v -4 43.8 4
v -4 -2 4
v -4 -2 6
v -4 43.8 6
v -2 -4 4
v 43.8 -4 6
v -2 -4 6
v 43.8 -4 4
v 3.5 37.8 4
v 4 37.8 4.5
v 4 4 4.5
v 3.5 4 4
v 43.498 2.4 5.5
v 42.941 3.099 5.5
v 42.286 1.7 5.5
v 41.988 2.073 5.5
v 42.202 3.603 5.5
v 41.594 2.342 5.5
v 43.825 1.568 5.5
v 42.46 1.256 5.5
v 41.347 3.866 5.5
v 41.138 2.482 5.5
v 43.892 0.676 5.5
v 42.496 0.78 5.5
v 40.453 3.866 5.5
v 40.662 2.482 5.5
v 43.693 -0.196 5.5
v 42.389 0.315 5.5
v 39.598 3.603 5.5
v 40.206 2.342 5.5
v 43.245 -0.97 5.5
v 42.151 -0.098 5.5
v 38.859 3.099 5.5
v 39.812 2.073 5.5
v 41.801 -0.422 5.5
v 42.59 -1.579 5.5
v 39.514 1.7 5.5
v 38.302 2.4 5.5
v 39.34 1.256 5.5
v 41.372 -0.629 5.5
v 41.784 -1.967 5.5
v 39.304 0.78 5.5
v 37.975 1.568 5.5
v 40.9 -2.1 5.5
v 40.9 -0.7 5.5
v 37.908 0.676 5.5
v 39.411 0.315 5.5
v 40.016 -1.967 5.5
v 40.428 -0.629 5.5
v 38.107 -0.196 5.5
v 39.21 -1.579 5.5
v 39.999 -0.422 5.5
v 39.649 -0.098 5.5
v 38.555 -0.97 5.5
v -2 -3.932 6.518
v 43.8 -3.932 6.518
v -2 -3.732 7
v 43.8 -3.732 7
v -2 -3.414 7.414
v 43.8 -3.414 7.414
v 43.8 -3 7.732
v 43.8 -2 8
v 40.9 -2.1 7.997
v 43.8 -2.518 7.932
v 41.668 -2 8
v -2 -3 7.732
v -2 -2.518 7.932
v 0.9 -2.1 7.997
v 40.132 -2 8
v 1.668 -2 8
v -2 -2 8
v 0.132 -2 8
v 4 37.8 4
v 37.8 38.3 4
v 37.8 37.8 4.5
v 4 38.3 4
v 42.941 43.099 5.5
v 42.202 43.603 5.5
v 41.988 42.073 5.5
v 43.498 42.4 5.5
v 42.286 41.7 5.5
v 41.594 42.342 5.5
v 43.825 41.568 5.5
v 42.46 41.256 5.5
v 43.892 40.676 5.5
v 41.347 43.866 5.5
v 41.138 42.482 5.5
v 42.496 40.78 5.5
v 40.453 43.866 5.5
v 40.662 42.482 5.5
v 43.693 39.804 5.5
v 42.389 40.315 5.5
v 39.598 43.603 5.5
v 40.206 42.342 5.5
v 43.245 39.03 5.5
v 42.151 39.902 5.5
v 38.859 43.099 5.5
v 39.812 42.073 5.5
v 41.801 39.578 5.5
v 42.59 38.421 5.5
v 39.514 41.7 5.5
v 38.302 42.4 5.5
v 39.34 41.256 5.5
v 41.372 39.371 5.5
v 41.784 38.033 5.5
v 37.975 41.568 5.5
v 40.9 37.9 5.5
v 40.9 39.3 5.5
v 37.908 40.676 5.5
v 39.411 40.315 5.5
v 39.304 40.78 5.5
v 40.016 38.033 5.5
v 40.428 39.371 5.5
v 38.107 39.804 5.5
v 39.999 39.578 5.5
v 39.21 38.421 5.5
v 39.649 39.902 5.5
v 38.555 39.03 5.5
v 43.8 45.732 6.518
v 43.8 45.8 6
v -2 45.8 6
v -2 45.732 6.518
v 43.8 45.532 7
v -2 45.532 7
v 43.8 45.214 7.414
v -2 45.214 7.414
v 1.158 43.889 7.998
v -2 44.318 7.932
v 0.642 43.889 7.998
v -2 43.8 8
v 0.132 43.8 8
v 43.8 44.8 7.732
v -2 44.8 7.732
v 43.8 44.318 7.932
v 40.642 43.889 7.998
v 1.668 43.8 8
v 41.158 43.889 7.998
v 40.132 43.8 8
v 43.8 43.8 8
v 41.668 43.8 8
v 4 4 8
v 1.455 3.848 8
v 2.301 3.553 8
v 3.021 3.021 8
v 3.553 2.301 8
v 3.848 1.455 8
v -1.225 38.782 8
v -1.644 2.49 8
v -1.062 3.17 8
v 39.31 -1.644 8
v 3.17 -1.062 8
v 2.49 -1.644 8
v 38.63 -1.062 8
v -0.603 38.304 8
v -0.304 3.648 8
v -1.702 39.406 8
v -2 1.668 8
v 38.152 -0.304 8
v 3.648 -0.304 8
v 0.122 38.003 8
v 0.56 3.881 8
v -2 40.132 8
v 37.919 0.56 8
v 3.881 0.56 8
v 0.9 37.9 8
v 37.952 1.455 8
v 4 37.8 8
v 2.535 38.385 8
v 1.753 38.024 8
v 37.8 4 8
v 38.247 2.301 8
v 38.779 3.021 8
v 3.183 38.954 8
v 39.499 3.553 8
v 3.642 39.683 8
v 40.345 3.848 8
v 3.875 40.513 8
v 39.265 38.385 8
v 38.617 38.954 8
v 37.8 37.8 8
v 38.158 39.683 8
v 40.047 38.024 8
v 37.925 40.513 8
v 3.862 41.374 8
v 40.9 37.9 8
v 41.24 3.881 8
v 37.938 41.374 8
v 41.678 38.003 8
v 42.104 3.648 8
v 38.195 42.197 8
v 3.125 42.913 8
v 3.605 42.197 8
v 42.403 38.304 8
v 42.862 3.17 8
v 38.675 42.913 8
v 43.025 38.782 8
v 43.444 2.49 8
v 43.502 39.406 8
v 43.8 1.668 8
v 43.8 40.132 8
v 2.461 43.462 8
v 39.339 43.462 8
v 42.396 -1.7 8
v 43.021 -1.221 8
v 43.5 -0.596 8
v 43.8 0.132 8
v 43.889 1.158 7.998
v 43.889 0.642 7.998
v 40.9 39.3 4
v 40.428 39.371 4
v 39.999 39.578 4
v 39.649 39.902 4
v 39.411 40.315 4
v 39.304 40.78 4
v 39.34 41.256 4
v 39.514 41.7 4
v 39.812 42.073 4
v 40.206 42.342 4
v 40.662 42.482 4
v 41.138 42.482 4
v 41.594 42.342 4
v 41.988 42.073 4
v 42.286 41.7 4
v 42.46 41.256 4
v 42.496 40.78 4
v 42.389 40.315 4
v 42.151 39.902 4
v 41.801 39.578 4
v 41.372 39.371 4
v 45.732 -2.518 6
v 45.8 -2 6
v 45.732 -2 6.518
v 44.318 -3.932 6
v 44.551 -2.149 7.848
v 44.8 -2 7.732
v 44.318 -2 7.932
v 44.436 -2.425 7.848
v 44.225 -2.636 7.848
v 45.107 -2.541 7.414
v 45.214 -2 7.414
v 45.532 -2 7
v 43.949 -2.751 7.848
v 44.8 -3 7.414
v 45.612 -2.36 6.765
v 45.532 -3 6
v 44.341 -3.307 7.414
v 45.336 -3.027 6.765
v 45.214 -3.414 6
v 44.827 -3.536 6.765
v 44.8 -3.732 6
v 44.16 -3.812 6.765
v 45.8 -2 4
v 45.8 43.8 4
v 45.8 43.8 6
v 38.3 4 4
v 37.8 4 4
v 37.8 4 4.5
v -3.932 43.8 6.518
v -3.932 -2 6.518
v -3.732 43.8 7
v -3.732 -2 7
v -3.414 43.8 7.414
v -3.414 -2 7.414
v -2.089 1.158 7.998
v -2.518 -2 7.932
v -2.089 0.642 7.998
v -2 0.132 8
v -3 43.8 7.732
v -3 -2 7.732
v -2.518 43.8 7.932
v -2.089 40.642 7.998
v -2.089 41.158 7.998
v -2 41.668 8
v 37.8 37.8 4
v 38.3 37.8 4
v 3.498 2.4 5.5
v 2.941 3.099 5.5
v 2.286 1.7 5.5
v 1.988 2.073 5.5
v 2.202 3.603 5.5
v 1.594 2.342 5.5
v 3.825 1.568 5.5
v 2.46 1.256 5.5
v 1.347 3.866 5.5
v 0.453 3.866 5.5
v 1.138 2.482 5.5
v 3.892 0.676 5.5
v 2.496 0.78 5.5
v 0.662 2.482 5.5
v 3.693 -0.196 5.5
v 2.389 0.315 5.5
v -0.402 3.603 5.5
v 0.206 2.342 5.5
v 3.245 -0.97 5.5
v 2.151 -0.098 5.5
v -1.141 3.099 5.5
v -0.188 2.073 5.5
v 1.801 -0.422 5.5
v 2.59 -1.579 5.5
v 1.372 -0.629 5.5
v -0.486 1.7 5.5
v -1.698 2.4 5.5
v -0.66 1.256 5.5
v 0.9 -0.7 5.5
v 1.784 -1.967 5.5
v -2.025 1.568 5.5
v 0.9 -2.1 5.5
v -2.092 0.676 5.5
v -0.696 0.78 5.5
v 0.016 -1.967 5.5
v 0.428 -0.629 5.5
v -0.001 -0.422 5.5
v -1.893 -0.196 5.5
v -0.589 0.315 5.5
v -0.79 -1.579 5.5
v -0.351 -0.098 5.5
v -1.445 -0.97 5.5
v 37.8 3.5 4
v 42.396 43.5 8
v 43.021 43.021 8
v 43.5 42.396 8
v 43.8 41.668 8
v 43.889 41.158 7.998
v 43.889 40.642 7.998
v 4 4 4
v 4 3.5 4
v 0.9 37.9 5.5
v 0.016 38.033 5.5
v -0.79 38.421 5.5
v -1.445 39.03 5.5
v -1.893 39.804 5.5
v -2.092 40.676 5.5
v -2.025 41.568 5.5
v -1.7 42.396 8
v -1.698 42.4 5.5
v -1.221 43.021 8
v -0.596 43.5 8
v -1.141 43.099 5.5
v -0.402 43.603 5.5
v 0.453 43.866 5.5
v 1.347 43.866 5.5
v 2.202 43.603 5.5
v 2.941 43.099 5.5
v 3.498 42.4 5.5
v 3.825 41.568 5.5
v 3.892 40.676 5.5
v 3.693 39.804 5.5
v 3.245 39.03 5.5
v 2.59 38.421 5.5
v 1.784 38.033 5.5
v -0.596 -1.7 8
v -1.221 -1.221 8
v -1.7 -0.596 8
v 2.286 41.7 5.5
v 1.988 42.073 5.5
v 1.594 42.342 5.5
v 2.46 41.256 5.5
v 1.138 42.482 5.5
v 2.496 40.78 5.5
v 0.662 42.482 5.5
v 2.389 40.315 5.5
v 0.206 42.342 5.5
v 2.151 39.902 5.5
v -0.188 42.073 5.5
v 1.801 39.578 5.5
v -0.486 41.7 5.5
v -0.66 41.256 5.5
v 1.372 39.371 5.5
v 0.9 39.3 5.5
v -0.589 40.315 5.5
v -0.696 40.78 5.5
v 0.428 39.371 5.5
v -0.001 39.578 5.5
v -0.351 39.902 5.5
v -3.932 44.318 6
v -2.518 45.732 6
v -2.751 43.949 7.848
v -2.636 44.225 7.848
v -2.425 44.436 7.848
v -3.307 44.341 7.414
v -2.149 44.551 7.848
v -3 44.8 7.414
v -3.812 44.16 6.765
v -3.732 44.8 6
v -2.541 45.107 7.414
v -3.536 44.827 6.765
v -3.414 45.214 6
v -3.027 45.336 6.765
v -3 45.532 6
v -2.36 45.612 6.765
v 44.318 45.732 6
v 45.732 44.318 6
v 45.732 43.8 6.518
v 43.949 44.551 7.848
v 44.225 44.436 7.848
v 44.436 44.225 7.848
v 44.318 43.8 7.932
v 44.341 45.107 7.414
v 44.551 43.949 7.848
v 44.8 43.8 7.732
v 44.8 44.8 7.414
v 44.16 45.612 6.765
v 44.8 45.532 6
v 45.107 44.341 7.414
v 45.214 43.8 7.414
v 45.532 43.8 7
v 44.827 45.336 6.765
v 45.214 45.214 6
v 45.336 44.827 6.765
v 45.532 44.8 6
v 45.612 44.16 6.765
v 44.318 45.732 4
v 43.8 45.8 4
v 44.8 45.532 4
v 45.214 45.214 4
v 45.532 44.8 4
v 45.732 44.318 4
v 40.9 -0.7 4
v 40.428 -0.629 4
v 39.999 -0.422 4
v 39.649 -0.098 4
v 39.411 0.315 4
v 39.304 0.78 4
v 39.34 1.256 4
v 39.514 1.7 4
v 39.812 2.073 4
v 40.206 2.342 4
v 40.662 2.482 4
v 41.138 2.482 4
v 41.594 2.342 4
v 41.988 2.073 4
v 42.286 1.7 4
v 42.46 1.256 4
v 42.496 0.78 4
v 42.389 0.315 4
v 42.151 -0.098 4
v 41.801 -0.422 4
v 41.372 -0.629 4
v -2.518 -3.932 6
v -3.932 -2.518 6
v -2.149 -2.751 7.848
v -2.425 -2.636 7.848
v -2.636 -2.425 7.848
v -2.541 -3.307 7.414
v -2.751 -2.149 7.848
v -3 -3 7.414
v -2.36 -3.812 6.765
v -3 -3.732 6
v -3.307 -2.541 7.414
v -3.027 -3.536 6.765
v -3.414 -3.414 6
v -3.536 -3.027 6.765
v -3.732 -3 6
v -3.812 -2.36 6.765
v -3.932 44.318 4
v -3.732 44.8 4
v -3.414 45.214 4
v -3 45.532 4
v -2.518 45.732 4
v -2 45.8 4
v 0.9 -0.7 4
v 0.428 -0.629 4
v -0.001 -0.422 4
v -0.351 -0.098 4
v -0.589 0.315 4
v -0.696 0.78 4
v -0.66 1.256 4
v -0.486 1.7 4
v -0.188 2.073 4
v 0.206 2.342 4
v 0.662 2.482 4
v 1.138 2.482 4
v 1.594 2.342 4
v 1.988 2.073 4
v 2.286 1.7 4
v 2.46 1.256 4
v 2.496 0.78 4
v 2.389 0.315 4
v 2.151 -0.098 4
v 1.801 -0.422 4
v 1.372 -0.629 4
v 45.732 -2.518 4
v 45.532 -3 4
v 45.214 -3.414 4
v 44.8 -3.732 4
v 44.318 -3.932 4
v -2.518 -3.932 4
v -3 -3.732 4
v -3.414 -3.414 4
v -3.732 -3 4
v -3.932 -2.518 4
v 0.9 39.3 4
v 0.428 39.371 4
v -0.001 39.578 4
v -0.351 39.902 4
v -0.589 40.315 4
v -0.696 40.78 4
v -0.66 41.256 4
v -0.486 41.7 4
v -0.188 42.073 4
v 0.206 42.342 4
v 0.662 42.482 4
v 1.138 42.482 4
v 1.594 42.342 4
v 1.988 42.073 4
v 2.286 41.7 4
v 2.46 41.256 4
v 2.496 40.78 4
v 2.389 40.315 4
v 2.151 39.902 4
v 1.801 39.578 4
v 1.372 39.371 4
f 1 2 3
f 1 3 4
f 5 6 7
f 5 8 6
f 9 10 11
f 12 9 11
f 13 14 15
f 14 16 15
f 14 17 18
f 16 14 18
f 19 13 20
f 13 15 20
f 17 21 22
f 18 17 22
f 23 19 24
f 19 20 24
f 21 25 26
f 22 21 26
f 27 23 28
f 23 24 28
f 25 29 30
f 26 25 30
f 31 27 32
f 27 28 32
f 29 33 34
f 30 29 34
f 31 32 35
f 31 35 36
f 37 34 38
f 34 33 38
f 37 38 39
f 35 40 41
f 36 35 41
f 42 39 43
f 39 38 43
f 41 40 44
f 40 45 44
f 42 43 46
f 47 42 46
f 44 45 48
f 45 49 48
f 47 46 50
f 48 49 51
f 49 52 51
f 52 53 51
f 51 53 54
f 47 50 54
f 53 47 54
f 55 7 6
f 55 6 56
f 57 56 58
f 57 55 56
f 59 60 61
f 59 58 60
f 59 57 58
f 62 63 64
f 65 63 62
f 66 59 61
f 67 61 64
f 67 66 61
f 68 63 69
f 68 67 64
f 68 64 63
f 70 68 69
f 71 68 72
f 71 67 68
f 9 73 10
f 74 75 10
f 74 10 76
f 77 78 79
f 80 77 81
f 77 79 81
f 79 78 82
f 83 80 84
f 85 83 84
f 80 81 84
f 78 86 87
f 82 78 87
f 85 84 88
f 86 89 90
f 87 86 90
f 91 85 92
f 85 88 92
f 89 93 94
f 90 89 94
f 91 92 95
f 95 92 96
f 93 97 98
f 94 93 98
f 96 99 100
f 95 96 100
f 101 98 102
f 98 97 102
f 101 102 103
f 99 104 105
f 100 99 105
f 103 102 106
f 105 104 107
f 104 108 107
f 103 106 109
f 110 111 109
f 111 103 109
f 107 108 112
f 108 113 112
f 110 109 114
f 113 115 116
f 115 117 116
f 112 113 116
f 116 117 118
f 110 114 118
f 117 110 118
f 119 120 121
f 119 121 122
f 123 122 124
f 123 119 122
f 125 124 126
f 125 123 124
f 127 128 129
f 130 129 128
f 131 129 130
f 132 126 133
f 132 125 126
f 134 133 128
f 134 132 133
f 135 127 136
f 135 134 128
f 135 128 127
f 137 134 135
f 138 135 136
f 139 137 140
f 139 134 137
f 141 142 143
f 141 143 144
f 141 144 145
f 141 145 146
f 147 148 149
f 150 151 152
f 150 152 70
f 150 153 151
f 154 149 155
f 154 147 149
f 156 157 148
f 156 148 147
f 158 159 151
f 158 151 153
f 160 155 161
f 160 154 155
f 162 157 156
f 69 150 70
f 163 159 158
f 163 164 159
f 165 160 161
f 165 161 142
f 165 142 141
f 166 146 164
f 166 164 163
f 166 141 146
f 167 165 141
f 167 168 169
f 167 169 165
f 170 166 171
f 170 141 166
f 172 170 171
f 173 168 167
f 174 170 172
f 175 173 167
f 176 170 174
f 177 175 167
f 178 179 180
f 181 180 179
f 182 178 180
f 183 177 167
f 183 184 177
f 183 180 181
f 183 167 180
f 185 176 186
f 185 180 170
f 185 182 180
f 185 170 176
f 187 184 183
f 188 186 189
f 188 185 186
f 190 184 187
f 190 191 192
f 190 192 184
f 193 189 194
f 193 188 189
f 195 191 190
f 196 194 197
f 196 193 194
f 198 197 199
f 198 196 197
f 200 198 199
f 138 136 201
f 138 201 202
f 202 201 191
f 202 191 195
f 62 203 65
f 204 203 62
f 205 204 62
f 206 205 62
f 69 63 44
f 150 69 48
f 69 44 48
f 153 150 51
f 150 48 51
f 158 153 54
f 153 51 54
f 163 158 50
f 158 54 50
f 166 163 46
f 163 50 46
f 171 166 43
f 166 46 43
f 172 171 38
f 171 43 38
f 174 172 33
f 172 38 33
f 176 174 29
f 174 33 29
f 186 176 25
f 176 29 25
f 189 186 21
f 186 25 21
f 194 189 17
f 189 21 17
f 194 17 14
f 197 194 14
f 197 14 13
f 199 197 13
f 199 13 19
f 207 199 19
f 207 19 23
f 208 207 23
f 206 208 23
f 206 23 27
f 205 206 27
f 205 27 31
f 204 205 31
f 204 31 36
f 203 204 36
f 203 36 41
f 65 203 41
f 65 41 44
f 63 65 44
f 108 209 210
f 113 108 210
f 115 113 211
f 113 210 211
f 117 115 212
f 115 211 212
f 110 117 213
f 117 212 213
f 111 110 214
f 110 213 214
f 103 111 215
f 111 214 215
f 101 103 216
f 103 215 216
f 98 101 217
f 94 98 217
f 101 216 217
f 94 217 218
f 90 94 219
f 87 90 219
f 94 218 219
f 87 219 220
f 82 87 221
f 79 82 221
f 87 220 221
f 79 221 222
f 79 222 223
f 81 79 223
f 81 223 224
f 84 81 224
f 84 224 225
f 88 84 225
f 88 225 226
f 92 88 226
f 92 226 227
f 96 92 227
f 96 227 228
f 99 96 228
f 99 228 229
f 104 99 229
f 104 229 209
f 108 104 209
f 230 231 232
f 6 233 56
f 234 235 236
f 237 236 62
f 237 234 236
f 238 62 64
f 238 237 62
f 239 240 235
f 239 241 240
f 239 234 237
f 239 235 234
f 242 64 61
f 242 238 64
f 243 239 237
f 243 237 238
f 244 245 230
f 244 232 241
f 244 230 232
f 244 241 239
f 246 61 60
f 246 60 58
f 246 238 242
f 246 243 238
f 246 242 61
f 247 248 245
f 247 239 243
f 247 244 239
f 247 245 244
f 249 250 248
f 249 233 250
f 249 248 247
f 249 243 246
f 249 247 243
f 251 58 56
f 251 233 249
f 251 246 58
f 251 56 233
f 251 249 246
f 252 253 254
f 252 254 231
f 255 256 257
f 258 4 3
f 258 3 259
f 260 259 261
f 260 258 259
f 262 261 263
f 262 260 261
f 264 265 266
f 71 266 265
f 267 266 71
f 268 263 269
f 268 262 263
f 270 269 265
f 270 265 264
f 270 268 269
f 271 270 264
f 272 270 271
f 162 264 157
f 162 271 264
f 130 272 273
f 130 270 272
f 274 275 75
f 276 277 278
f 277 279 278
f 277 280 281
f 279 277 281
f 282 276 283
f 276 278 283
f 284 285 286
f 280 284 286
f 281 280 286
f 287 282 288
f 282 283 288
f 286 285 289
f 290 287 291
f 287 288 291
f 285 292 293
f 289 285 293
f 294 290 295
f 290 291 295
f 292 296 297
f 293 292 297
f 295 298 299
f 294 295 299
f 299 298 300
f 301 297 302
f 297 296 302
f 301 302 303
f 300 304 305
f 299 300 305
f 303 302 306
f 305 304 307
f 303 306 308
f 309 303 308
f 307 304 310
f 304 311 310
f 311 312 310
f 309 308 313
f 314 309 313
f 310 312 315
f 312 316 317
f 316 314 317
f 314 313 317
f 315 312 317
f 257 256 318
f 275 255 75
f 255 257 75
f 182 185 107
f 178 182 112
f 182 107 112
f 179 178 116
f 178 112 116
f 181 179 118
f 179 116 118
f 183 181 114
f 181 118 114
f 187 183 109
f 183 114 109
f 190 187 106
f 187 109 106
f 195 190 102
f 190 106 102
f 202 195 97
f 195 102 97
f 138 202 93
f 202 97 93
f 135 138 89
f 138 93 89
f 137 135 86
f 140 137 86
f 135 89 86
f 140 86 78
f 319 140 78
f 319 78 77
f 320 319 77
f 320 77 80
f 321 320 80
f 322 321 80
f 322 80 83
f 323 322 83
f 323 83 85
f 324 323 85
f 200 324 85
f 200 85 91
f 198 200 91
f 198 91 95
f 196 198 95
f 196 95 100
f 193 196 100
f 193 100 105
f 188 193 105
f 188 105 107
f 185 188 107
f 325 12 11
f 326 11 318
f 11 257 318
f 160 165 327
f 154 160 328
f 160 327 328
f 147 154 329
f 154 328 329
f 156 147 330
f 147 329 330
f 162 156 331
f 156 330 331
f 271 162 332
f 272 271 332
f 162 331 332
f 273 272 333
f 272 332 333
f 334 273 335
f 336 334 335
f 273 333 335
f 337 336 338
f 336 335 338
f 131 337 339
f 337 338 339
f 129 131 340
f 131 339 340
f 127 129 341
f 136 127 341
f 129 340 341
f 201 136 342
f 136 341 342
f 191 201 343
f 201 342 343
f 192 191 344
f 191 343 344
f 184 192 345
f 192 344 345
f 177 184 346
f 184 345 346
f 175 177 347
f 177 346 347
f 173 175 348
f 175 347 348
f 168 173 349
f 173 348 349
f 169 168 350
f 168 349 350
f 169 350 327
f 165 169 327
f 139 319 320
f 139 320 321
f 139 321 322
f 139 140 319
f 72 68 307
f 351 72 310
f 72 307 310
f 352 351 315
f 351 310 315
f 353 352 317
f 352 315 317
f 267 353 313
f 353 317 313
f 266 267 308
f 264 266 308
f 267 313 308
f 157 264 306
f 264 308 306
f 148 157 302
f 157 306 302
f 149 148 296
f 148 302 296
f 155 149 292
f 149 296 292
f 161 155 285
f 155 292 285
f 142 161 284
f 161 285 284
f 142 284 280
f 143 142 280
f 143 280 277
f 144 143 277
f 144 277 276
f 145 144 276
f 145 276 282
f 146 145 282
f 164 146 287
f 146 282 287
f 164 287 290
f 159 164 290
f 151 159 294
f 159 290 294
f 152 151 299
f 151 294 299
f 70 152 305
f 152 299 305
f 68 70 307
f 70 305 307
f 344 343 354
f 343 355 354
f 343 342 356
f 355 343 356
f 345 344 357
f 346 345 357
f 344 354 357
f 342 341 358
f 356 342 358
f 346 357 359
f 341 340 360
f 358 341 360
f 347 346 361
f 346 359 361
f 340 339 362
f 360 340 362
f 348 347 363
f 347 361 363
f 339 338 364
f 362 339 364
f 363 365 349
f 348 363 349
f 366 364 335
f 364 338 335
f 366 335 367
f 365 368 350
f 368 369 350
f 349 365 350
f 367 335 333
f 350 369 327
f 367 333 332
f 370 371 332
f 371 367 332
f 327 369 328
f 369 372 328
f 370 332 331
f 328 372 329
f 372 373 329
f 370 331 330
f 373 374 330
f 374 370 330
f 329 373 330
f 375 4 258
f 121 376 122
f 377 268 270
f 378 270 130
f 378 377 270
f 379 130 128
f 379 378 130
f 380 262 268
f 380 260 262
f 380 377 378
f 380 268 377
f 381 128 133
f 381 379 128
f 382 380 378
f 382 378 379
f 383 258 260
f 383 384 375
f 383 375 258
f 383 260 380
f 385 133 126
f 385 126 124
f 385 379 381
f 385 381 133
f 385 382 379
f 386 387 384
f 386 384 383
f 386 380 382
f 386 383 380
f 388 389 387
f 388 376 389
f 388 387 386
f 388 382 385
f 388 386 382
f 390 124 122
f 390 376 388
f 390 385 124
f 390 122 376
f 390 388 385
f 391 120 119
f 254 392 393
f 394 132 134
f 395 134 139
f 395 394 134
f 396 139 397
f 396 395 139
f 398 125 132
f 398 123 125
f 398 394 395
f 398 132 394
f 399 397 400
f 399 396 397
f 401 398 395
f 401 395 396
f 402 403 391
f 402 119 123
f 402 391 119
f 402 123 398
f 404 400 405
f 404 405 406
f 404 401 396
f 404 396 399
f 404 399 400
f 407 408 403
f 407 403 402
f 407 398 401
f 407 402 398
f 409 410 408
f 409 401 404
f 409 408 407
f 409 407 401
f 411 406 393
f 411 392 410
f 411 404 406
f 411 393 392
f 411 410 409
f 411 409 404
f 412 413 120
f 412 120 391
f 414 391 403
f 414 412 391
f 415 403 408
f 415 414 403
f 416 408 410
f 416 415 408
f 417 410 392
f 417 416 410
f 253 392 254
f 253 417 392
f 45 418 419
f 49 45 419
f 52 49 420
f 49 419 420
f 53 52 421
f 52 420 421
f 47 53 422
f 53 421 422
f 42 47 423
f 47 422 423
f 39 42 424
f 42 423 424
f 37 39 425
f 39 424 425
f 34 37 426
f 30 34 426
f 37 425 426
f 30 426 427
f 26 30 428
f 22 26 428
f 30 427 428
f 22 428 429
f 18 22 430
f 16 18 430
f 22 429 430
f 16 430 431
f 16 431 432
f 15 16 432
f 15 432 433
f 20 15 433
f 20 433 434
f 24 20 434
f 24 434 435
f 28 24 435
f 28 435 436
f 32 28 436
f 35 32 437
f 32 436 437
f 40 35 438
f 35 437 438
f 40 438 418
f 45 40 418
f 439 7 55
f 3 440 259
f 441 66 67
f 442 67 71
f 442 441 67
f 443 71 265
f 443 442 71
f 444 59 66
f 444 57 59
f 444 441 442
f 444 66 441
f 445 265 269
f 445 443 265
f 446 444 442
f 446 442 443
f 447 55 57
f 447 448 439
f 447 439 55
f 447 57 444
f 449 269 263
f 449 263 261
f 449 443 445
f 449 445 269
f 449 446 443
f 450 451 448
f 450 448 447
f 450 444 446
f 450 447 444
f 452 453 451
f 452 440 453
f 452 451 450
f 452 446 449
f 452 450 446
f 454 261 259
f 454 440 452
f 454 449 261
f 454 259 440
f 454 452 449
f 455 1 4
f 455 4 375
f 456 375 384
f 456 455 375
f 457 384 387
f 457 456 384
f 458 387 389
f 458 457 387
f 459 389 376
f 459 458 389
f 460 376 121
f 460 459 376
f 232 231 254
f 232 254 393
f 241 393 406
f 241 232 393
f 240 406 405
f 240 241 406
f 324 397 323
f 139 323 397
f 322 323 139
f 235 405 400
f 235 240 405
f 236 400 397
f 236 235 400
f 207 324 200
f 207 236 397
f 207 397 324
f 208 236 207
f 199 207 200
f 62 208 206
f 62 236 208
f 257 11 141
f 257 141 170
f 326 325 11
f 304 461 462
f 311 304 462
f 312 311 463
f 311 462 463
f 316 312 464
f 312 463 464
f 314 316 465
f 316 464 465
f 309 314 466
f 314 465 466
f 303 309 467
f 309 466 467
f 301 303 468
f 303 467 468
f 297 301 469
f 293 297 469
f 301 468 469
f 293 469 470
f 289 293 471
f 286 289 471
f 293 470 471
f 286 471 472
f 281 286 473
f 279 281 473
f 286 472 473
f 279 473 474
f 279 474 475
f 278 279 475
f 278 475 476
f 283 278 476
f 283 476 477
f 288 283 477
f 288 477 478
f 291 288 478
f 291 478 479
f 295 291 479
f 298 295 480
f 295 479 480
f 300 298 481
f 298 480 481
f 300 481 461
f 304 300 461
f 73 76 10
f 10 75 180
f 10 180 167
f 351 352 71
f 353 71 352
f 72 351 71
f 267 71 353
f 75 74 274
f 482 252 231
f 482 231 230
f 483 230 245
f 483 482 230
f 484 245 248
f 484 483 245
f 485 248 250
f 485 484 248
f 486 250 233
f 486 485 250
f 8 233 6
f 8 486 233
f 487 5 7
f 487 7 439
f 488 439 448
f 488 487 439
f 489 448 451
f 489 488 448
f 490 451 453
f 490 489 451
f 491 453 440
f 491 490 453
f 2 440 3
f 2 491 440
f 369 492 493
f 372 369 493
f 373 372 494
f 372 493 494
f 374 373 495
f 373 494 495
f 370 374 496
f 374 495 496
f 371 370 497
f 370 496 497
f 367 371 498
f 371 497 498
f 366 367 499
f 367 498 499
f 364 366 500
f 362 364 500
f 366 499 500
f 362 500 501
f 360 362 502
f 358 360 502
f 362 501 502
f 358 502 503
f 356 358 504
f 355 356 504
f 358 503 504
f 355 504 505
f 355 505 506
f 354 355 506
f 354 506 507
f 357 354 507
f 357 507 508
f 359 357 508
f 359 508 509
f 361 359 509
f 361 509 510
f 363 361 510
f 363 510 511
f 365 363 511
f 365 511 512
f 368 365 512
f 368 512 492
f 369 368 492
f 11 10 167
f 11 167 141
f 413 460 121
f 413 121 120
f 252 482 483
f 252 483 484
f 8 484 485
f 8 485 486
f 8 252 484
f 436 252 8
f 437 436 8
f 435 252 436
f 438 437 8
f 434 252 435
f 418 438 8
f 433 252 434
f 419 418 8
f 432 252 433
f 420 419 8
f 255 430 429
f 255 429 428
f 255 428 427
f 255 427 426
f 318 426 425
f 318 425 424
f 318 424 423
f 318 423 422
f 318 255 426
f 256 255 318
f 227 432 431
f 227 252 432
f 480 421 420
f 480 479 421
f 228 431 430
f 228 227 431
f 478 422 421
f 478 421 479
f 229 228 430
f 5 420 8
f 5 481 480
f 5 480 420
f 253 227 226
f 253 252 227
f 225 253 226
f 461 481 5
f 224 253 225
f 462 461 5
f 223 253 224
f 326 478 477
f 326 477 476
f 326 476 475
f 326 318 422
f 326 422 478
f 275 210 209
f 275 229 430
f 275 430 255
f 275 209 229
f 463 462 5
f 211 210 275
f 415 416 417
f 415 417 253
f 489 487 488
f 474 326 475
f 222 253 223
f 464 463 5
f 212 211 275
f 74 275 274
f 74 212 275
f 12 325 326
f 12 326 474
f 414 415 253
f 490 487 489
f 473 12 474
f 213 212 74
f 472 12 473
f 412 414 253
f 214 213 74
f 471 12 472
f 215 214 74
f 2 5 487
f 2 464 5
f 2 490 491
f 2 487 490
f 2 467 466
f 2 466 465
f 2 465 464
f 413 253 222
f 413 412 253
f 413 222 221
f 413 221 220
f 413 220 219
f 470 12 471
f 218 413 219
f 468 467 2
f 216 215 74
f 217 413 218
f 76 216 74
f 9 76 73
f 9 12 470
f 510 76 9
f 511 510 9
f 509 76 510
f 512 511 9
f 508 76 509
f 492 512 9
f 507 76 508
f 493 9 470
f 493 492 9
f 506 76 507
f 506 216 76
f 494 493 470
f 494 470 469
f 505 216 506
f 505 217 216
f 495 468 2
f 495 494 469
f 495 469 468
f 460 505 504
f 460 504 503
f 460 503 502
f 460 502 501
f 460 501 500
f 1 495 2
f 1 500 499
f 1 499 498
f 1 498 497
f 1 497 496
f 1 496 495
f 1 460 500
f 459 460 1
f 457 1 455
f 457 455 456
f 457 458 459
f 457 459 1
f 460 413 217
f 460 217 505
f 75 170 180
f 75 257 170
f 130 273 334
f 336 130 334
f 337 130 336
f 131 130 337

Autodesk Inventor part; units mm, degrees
ref_plane "YZ Plane" through (0, 0, 0) normal (1, 0, 0) x (0, 1, 0)
ref_plane "XZ Plane" through (0, 0, 0) normal (0, 1, 0) x (-1, 0, 0)
ref_plane "XY Plane" through (0, 0, 0) normal (0, 0, 1) x (1, 0, 0)
ref_plane "Work Plane1" through (0, 41.8, 0) normal (0, 0, 1) x (1, 0, 0)
sketch "Sketch1" plane through (0, 41.8, 0) normal (0, 0, 1) x (1, 0, 0)
  line L0 (4, 0.3838) -> (4, 4) construction
  line L1 (4, 4) -> (-2, 4) construction
  arc A0 (-2, 4) -> (-4, 2) centre (-2, 2) ccw construction
  line L2 (-4, 2) -> (-4, -4) construction
  line L3 (-4, -4) -> (-0.3838, -4) construction
  arc A1 (45.8, 2) -> (43.8, 4) centre (43.8, 2) ccw construction
  line L4 (43.8, 4) -> (37.8, 4) construction
  line L5 (37.8, 4) -> (37.8, 0.3838) construction
  line L6 (42.1838, -4) -> (45.8, -4) construction
  line L7 (45.8, -4) -> (45.8, 2) construction
  line L8 (37.8, -42.1838) -> (37.8, -45.8) construction
  line L9 (37.8, -45.8) -> (43.8, -45.8) construction
  arc A2 (43.8, -45.8) -> (45.8, -43.8) centre (43.8, -43.8) ccw construction
  line L10 (45.8, -43.8) -> (45.8, -37.8) construction
  line L11 (45.8, -37.8) -> (42.1838, -37.8) construction
  line L12 (-0.3838, -37.8) -> (-4, -37.8) construction
  line L13 (-4, -37.8) -> (-4, -43.8) construction
  arc A3 (-4, -43.8) -> (-2, -45.8) centre (-2, -43.8) ccw construction
  line L14 (-2, -45.8) -> (4, -45.8) construction
  line L15 (4, -45.8) -> (4, -42.1838) construction
  line L16 (-2, 4) -> (43.8, 4)
  line L17 (45.8, 2) -> (45.8, -43.8)
  line L18 (43.8, -45.8) -> (-2, -45.8)
  line L19 (-4, -43.8) -> (-4, 2)
  line L20 (40.3, -37.8) -> (40.3, -4)
  line L21 (37.8, -1.5) -> (4, -1.5)
  line L22 (1.5, -4) -> (1.5, -37.8)
  line L23 (4, -40.3) -> (37.8, -40.3)
  line L24 (37.8, -40.3) -> (40.3, -37.8)
  line L25 (4, -40.3) -> (1.5, -37.8)
  line L26 (4, -1.5) -> (1.5, -4)
  line L27 (40.3, -4) -> (37.8, -1.5)
  arc A4 (45.8, 2) -> (43.8, 4) centre (43.8, 2) ccw
  arc A5 (43.8, -45.8) -> (45.8, -43.8) centre (43.8, -43.8) ccw
  arc A6 (-4, -43.8) -> (-2, -45.8) centre (-2, -43.8) ccw
  arc A7 (-2, 4) -> (-4, 2) centre (-2, 2) ccw
  circle A8 centre (1, -1) radius 1.4
  circle A9 centre (40.8, -1) radius 1.4
  circle A10 centre (40.8, -40.8) radius 1.4
  circle A11 centre (1, -40.8) radius 1.4
  circle A12 centre (20.9, -20.9) radius 19.4 construction
  line L28 (4, -4) -> (4, -37.8)
  line L29 (4, -37.8) -> (37.8, -37.8)
  line L30 (37.8, -37.8) -> (37.8, -4)
  line L31 (37.8, -4) -> (4, -4)
  arc A13 (39.5978, -40.386) -> (40.386, -39.5978) centre (40.9, -40.9) ccw projected
  line L32 (39.5978, -40.386) -> (37.8, -42.1838) projected
  line L33 (42.1838, -37.8) -> (40.386, -39.5978) projected
  arc A14 (1.414, -39.5978) -> (2.2022, -40.386) centre (0.9, -40.9) ccw projected
  line L34 (1.414, -39.5978) -> (-0.3838, -37.8) projected
  line L35 (4, -42.1838) -> (2.2022, -40.386) projected
  arc A15 (40.386, -2.2022) -> (39.5978, -1.414) centre (40.9, -0.9) ccw projected
  line L36 (40.386, -2.2022) -> (42.1838, -4) projected
  line L37 (37.8, 0.3838) -> (39.5978, -1.414) projected
  arc A16 (2.2022, -1.414) -> (1.414, -2.2022) centre (0.9, -0.9) ccw projected
  line L38 (2.2022, -1.414) -> (4, 0.3838) projected
  line L39 (-0.3838, -4) -> (1.414, -2.2022) projected
  point P0 (45.8, -45.8)
  point P1 (45.8, 4)
  point P2 (-4, -45.8)
  point P3 (40.3, -40.3)
  point P4 (40.3, -1.5)
  point P5 (1.5, -1.5)
  point P6 (1.5, -40.3)
  point P7 (40.8, -1)
  dimension "d55" = 2.8
  dimension "d56" = 2.8
  dimension "d57" = 2.8
  dimension "d58" = 2.8
  dimension "d34" = 49.8
  dimension "d35" = 49.8
  dimension "d36" = 5.5
  dimension "d37" = 2.5
  dimension "d38" = 2.5
  dimension "d39" = 2.5
  dimension "d40" = 2.5
  dimension "d41" = 2.5
  dimension "d42" = 2.5
  dimension "d43" = 2.5
  dimension "d44" = 2.5
  dimension "d45" = 2
  dimension "d46" = 5
  dimension "d47" = 5
  dimension "d48" = 5
  dimension "d49" = 5
  dimension "d50" = 5
  dimension "d51" = 5
  dimension "d52" = 0.5
  dimension "d53" = 5
  dimension "d54" = 5
  dimension "d90" = 8
extrude "Extrusion1" add sketch "Sketch1" along normal blind 8 contours L16 A4 L17 A5 L18 A6 L19 A7 | L24 L23 L25 L22 L26 L21 L27 L20 | A8 A16 | A9 A15 | A10 A13 | A14 A11
fillet "Fillet1" radius 2 8 edges at (20.9, -4, 8) (45.2142, -3.4142, 8) (45.8, 20.9, 8) (45.2142, 45.2142, 8) (20.9, 45.8, 8) (-3.4142, 45.2142, 8) (-4, 20.9, 8) (-3.4142, -3.4142, 8)
sketch "Sketch2" plane through (-2, -4, 0) normal (0, -1, 0) x (1, 0, 0)
  line L0 (43.8, -4.8712) -> (42.35, -4)
  line L1 (2, -4.8712) -> (0.55, -4)
  line L2 (-2, 0) -> (-2, 6) construction
  line L3 (45.8, 8) -> (0, 8) construction
  line L4 (47.8, 0) -> (47.8, 6) construction
  circle A0 centre (2.9, -36.9) radius 1.45 projected
  line L5 (0, -41.8) -> (45.8, -41.8) projected
  point P0 (2, 0)
  point P1 (2.9, 3.1)
  point P2 (42.9, 3.1)
  dimension "d59" = 4.9
  dimension "d60" = 4.9
  dimension "d61" = 4.9
  dimension "d62" = 4.9
hole "Hole1" [suppressed]
sketch "Sketch3" plane through (0, 41.8, 8) normal (0, 0, 1) x (1, 0, 0)
  circle A0 centre (20.9, -20.9) radius 16.9 construction
  point P0 (0, -41.8)
sketch "Sketch4" plane through (0, 41.8, 8) normal (0, 0, 1) x (1, 0, 0)
  line L0 (37.8, -37.8) -> (37.8, -4) projected
  line L1 (37.8, -4) -> (4, -4) projected
  line L2 (4, -4) -> (4, -37.8) projected
  line L3 (4, -37.8) -> (37.8, -37.8) projected
  circle A0 centre (40.9, -0.9) radius 2.75 projected
  circle A1 centre (0.9, -40.9) radius 2.75 projected
  circle A2 centre (0.9, -0.9) radius 2.75 projected
  circle A3 centre (40.9, -40.9) radius 2.75 projected
  line L4 (43.8, 2) -> (-2, 2) projected
  line L5 (43.8, -43.8) -> (43.8, 2) projected
  line L6 (-2, -43.8) -> (43.8, -43.8) projected
  line L7 (-2, 2) -> (-2, -43.8) projected
hole "Hole2" at (40.9, 40.9, 8) at (40.9, 0.9, 8) at (0.9, 0.9, 8) at (0.9, 40.9, 8) direction (0, 0, -1) diameter 3.2 depth 12 tip angle 118 counterbore diameter 6 counterbore depth 2.5
chamfer "Chamfer2" distance 4.5 angle 45 2 edges at (4, 20.9, 0) (37.8, 20.9, 0)
sketch "Sketch6" plane through (-4, -2, 0) normal (-1, 0, 0) x (0, 0, 1)
  line L0 (0, -2) -> (6, -2) construction
  line L1 (8, 0) -> (8, 45.8) construction
  line L2 (0, 47.8) -> (6, 47.8) construction
  circle A0 centre (3.1, 42.9) radius 1.4 construction
  circle A1 centre (3.1, 2.9) radius 1.4 construction
  point P0 (0, 2)
  dimension "d63" = 2.8
  dimension "d64" = 2.8
  dimension "d65" = 4.9
  dimension "d66" = 4.9
  dimension "d67" = 4.9
  dimension "d68" = 4.9
hole "Hole3" [suppressed]
sketch "Sketch7" plane through (45.8, -2, 0) normal (1, 0, 0) x (0, 0, -1)
  circle A0 centre (-3.1, 42.9) radius 1.4 projected
  circle A1 centre (-3.1, 2.9) radius 1.4 projected
  point P0 (0, 2)
hole "Hole4" [suppressed]
sketch "Sketch8" plane through (-2, 45.8, 0) normal (0, 1, 0) x (1, 0, 0)
  circle A0 centre (2.9, -3.1) radius 1.45 projected
  circle A1 centre (42.9, -3.1) radius 1.45 projected
  point P0 (2, 0)
  point P1 (4.35, -3.1)
  point P2 (4.35, -3.1)
  point P3 (44.35, -3.1)
  point P4 (44.35, -3.1)
hole "Hole5" [suppressed]
sketch "Sketch9" plane through (37.8, 4, 8) normal (-1, 0, 0) x (0, 0, 1)
  line L0 (-8, 0) -> (-3.5, 0) projected
  line L1 (-3.5, 33.8) -> (-8, 33.8) projected
  line L2 (-3.5, 0) -> (-8, -4.5)
  line L3 (-8, 39.8) -> (-8, -6) projected
  line L4 (-3.5, 0) -> (2.864, 0) construction
  line L5 (-8, -4.5) -> (-8, 0)
  line L6 (-3.5, 33.8) -> (-8, 38.3)
  line L7 (-3.5, 33.8) -> (2.864, 33.8) construction
  line L8 (-8, 38.3) -> (-8, 33.8)
  line L9 (-8, 33.8) -> (-3.5, 33.8)
  point P0 (-8, -4)
  dimension "d91" = 135
  dimension "d92" = 135
extrude "Extrusion3" cut sketch "Sketch9" along normal up to surface (33.8 mm away)
sketch "Sketch13" plane through (0, 41.8, 0) normal (0, 0, -1) x (-1, 0, 0)
  line L0 (-37.8, -42.3) -> (-37.8, -37.8) projected
  line L1 (-37.8, -37.8) -> (-42.3, -37.8) projected
  line L2 (-42.3, -4) -> (-42.3, -37.8) projected
  line L3 (-42.3, -4) -> (-37.8, -4) projected
  line L4 (-37.8, -4) -> (-37.8, 0.5) projected
  line L5 (-37.8, 0.5) -> (-4, 0.5) projected
  line L6 (-4, 0.5) -> (-4, -4) projected
  line L7 (-4, -4) -> (0.5, -4) projected
  line L8 (0.5, -37.8) -> (0.5, -4) projected
  line L9 (0.5, -37.8) -> (-4, -37.8) projected
  line L10 (-4, -37.8) -> (-4, -42.3) projected
  line L11 (-4, -42.3) -> (-37.8, -42.3) projected
  circle A0 centre (-0.9, -40.9) radius 1.6 projected
  circle A1 centre (-40.9, -0.9) radius 1.6 projected
  circle A2 centre (-40.9, -40.9) radius 1.6 projected
  circle A3 centre (-0.9, -0.9) radius 1.6 projected
  line L12 (-45.8, 2) -> (-45.8, -43.8) projected
  arc A4 (-45.8, -43.8) -> (-43.8, -45.8) centre (-43.8, -43.8) ccw projected
  line L13 (-43.8, -45.8) -> (2, -45.8) projected
  arc A5 (2, -45.8) -> (4, -43.8) centre (2, -43.8) ccw projected
  line L14 (4, -43.8) -> (4, 2) projected
  arc A6 (4, 2) -> (2, 4) centre (2, 2) ccw projected
  line L15 (2, 4) -> (-43.8, 4) projected
  arc A7 (-43.8, 4) -> (-45.8, 2) centre (-43.8, 2) ccw projected
  point P0 (0, -41.8)
extrude "Extrusion5" cut sketch "Sketch13" against normal blind 4 contours L0 L1 L2 L3 L4 L5 L6 L7 L8 L9 L10 L11 | A7 L15 A6 L14 A5 L13 A4 L12
equation "\"d38\" = d37"
equation "\"d39\" = d37"
equation "\"d40\" = d39"
equation "\"d41\" = d37"
equation "\"d42\" = d41"
equation "\"d43\" = d37"
equation "\"d44\" = d43"
properties part number "10_Lid_1x1_v2_thin"
